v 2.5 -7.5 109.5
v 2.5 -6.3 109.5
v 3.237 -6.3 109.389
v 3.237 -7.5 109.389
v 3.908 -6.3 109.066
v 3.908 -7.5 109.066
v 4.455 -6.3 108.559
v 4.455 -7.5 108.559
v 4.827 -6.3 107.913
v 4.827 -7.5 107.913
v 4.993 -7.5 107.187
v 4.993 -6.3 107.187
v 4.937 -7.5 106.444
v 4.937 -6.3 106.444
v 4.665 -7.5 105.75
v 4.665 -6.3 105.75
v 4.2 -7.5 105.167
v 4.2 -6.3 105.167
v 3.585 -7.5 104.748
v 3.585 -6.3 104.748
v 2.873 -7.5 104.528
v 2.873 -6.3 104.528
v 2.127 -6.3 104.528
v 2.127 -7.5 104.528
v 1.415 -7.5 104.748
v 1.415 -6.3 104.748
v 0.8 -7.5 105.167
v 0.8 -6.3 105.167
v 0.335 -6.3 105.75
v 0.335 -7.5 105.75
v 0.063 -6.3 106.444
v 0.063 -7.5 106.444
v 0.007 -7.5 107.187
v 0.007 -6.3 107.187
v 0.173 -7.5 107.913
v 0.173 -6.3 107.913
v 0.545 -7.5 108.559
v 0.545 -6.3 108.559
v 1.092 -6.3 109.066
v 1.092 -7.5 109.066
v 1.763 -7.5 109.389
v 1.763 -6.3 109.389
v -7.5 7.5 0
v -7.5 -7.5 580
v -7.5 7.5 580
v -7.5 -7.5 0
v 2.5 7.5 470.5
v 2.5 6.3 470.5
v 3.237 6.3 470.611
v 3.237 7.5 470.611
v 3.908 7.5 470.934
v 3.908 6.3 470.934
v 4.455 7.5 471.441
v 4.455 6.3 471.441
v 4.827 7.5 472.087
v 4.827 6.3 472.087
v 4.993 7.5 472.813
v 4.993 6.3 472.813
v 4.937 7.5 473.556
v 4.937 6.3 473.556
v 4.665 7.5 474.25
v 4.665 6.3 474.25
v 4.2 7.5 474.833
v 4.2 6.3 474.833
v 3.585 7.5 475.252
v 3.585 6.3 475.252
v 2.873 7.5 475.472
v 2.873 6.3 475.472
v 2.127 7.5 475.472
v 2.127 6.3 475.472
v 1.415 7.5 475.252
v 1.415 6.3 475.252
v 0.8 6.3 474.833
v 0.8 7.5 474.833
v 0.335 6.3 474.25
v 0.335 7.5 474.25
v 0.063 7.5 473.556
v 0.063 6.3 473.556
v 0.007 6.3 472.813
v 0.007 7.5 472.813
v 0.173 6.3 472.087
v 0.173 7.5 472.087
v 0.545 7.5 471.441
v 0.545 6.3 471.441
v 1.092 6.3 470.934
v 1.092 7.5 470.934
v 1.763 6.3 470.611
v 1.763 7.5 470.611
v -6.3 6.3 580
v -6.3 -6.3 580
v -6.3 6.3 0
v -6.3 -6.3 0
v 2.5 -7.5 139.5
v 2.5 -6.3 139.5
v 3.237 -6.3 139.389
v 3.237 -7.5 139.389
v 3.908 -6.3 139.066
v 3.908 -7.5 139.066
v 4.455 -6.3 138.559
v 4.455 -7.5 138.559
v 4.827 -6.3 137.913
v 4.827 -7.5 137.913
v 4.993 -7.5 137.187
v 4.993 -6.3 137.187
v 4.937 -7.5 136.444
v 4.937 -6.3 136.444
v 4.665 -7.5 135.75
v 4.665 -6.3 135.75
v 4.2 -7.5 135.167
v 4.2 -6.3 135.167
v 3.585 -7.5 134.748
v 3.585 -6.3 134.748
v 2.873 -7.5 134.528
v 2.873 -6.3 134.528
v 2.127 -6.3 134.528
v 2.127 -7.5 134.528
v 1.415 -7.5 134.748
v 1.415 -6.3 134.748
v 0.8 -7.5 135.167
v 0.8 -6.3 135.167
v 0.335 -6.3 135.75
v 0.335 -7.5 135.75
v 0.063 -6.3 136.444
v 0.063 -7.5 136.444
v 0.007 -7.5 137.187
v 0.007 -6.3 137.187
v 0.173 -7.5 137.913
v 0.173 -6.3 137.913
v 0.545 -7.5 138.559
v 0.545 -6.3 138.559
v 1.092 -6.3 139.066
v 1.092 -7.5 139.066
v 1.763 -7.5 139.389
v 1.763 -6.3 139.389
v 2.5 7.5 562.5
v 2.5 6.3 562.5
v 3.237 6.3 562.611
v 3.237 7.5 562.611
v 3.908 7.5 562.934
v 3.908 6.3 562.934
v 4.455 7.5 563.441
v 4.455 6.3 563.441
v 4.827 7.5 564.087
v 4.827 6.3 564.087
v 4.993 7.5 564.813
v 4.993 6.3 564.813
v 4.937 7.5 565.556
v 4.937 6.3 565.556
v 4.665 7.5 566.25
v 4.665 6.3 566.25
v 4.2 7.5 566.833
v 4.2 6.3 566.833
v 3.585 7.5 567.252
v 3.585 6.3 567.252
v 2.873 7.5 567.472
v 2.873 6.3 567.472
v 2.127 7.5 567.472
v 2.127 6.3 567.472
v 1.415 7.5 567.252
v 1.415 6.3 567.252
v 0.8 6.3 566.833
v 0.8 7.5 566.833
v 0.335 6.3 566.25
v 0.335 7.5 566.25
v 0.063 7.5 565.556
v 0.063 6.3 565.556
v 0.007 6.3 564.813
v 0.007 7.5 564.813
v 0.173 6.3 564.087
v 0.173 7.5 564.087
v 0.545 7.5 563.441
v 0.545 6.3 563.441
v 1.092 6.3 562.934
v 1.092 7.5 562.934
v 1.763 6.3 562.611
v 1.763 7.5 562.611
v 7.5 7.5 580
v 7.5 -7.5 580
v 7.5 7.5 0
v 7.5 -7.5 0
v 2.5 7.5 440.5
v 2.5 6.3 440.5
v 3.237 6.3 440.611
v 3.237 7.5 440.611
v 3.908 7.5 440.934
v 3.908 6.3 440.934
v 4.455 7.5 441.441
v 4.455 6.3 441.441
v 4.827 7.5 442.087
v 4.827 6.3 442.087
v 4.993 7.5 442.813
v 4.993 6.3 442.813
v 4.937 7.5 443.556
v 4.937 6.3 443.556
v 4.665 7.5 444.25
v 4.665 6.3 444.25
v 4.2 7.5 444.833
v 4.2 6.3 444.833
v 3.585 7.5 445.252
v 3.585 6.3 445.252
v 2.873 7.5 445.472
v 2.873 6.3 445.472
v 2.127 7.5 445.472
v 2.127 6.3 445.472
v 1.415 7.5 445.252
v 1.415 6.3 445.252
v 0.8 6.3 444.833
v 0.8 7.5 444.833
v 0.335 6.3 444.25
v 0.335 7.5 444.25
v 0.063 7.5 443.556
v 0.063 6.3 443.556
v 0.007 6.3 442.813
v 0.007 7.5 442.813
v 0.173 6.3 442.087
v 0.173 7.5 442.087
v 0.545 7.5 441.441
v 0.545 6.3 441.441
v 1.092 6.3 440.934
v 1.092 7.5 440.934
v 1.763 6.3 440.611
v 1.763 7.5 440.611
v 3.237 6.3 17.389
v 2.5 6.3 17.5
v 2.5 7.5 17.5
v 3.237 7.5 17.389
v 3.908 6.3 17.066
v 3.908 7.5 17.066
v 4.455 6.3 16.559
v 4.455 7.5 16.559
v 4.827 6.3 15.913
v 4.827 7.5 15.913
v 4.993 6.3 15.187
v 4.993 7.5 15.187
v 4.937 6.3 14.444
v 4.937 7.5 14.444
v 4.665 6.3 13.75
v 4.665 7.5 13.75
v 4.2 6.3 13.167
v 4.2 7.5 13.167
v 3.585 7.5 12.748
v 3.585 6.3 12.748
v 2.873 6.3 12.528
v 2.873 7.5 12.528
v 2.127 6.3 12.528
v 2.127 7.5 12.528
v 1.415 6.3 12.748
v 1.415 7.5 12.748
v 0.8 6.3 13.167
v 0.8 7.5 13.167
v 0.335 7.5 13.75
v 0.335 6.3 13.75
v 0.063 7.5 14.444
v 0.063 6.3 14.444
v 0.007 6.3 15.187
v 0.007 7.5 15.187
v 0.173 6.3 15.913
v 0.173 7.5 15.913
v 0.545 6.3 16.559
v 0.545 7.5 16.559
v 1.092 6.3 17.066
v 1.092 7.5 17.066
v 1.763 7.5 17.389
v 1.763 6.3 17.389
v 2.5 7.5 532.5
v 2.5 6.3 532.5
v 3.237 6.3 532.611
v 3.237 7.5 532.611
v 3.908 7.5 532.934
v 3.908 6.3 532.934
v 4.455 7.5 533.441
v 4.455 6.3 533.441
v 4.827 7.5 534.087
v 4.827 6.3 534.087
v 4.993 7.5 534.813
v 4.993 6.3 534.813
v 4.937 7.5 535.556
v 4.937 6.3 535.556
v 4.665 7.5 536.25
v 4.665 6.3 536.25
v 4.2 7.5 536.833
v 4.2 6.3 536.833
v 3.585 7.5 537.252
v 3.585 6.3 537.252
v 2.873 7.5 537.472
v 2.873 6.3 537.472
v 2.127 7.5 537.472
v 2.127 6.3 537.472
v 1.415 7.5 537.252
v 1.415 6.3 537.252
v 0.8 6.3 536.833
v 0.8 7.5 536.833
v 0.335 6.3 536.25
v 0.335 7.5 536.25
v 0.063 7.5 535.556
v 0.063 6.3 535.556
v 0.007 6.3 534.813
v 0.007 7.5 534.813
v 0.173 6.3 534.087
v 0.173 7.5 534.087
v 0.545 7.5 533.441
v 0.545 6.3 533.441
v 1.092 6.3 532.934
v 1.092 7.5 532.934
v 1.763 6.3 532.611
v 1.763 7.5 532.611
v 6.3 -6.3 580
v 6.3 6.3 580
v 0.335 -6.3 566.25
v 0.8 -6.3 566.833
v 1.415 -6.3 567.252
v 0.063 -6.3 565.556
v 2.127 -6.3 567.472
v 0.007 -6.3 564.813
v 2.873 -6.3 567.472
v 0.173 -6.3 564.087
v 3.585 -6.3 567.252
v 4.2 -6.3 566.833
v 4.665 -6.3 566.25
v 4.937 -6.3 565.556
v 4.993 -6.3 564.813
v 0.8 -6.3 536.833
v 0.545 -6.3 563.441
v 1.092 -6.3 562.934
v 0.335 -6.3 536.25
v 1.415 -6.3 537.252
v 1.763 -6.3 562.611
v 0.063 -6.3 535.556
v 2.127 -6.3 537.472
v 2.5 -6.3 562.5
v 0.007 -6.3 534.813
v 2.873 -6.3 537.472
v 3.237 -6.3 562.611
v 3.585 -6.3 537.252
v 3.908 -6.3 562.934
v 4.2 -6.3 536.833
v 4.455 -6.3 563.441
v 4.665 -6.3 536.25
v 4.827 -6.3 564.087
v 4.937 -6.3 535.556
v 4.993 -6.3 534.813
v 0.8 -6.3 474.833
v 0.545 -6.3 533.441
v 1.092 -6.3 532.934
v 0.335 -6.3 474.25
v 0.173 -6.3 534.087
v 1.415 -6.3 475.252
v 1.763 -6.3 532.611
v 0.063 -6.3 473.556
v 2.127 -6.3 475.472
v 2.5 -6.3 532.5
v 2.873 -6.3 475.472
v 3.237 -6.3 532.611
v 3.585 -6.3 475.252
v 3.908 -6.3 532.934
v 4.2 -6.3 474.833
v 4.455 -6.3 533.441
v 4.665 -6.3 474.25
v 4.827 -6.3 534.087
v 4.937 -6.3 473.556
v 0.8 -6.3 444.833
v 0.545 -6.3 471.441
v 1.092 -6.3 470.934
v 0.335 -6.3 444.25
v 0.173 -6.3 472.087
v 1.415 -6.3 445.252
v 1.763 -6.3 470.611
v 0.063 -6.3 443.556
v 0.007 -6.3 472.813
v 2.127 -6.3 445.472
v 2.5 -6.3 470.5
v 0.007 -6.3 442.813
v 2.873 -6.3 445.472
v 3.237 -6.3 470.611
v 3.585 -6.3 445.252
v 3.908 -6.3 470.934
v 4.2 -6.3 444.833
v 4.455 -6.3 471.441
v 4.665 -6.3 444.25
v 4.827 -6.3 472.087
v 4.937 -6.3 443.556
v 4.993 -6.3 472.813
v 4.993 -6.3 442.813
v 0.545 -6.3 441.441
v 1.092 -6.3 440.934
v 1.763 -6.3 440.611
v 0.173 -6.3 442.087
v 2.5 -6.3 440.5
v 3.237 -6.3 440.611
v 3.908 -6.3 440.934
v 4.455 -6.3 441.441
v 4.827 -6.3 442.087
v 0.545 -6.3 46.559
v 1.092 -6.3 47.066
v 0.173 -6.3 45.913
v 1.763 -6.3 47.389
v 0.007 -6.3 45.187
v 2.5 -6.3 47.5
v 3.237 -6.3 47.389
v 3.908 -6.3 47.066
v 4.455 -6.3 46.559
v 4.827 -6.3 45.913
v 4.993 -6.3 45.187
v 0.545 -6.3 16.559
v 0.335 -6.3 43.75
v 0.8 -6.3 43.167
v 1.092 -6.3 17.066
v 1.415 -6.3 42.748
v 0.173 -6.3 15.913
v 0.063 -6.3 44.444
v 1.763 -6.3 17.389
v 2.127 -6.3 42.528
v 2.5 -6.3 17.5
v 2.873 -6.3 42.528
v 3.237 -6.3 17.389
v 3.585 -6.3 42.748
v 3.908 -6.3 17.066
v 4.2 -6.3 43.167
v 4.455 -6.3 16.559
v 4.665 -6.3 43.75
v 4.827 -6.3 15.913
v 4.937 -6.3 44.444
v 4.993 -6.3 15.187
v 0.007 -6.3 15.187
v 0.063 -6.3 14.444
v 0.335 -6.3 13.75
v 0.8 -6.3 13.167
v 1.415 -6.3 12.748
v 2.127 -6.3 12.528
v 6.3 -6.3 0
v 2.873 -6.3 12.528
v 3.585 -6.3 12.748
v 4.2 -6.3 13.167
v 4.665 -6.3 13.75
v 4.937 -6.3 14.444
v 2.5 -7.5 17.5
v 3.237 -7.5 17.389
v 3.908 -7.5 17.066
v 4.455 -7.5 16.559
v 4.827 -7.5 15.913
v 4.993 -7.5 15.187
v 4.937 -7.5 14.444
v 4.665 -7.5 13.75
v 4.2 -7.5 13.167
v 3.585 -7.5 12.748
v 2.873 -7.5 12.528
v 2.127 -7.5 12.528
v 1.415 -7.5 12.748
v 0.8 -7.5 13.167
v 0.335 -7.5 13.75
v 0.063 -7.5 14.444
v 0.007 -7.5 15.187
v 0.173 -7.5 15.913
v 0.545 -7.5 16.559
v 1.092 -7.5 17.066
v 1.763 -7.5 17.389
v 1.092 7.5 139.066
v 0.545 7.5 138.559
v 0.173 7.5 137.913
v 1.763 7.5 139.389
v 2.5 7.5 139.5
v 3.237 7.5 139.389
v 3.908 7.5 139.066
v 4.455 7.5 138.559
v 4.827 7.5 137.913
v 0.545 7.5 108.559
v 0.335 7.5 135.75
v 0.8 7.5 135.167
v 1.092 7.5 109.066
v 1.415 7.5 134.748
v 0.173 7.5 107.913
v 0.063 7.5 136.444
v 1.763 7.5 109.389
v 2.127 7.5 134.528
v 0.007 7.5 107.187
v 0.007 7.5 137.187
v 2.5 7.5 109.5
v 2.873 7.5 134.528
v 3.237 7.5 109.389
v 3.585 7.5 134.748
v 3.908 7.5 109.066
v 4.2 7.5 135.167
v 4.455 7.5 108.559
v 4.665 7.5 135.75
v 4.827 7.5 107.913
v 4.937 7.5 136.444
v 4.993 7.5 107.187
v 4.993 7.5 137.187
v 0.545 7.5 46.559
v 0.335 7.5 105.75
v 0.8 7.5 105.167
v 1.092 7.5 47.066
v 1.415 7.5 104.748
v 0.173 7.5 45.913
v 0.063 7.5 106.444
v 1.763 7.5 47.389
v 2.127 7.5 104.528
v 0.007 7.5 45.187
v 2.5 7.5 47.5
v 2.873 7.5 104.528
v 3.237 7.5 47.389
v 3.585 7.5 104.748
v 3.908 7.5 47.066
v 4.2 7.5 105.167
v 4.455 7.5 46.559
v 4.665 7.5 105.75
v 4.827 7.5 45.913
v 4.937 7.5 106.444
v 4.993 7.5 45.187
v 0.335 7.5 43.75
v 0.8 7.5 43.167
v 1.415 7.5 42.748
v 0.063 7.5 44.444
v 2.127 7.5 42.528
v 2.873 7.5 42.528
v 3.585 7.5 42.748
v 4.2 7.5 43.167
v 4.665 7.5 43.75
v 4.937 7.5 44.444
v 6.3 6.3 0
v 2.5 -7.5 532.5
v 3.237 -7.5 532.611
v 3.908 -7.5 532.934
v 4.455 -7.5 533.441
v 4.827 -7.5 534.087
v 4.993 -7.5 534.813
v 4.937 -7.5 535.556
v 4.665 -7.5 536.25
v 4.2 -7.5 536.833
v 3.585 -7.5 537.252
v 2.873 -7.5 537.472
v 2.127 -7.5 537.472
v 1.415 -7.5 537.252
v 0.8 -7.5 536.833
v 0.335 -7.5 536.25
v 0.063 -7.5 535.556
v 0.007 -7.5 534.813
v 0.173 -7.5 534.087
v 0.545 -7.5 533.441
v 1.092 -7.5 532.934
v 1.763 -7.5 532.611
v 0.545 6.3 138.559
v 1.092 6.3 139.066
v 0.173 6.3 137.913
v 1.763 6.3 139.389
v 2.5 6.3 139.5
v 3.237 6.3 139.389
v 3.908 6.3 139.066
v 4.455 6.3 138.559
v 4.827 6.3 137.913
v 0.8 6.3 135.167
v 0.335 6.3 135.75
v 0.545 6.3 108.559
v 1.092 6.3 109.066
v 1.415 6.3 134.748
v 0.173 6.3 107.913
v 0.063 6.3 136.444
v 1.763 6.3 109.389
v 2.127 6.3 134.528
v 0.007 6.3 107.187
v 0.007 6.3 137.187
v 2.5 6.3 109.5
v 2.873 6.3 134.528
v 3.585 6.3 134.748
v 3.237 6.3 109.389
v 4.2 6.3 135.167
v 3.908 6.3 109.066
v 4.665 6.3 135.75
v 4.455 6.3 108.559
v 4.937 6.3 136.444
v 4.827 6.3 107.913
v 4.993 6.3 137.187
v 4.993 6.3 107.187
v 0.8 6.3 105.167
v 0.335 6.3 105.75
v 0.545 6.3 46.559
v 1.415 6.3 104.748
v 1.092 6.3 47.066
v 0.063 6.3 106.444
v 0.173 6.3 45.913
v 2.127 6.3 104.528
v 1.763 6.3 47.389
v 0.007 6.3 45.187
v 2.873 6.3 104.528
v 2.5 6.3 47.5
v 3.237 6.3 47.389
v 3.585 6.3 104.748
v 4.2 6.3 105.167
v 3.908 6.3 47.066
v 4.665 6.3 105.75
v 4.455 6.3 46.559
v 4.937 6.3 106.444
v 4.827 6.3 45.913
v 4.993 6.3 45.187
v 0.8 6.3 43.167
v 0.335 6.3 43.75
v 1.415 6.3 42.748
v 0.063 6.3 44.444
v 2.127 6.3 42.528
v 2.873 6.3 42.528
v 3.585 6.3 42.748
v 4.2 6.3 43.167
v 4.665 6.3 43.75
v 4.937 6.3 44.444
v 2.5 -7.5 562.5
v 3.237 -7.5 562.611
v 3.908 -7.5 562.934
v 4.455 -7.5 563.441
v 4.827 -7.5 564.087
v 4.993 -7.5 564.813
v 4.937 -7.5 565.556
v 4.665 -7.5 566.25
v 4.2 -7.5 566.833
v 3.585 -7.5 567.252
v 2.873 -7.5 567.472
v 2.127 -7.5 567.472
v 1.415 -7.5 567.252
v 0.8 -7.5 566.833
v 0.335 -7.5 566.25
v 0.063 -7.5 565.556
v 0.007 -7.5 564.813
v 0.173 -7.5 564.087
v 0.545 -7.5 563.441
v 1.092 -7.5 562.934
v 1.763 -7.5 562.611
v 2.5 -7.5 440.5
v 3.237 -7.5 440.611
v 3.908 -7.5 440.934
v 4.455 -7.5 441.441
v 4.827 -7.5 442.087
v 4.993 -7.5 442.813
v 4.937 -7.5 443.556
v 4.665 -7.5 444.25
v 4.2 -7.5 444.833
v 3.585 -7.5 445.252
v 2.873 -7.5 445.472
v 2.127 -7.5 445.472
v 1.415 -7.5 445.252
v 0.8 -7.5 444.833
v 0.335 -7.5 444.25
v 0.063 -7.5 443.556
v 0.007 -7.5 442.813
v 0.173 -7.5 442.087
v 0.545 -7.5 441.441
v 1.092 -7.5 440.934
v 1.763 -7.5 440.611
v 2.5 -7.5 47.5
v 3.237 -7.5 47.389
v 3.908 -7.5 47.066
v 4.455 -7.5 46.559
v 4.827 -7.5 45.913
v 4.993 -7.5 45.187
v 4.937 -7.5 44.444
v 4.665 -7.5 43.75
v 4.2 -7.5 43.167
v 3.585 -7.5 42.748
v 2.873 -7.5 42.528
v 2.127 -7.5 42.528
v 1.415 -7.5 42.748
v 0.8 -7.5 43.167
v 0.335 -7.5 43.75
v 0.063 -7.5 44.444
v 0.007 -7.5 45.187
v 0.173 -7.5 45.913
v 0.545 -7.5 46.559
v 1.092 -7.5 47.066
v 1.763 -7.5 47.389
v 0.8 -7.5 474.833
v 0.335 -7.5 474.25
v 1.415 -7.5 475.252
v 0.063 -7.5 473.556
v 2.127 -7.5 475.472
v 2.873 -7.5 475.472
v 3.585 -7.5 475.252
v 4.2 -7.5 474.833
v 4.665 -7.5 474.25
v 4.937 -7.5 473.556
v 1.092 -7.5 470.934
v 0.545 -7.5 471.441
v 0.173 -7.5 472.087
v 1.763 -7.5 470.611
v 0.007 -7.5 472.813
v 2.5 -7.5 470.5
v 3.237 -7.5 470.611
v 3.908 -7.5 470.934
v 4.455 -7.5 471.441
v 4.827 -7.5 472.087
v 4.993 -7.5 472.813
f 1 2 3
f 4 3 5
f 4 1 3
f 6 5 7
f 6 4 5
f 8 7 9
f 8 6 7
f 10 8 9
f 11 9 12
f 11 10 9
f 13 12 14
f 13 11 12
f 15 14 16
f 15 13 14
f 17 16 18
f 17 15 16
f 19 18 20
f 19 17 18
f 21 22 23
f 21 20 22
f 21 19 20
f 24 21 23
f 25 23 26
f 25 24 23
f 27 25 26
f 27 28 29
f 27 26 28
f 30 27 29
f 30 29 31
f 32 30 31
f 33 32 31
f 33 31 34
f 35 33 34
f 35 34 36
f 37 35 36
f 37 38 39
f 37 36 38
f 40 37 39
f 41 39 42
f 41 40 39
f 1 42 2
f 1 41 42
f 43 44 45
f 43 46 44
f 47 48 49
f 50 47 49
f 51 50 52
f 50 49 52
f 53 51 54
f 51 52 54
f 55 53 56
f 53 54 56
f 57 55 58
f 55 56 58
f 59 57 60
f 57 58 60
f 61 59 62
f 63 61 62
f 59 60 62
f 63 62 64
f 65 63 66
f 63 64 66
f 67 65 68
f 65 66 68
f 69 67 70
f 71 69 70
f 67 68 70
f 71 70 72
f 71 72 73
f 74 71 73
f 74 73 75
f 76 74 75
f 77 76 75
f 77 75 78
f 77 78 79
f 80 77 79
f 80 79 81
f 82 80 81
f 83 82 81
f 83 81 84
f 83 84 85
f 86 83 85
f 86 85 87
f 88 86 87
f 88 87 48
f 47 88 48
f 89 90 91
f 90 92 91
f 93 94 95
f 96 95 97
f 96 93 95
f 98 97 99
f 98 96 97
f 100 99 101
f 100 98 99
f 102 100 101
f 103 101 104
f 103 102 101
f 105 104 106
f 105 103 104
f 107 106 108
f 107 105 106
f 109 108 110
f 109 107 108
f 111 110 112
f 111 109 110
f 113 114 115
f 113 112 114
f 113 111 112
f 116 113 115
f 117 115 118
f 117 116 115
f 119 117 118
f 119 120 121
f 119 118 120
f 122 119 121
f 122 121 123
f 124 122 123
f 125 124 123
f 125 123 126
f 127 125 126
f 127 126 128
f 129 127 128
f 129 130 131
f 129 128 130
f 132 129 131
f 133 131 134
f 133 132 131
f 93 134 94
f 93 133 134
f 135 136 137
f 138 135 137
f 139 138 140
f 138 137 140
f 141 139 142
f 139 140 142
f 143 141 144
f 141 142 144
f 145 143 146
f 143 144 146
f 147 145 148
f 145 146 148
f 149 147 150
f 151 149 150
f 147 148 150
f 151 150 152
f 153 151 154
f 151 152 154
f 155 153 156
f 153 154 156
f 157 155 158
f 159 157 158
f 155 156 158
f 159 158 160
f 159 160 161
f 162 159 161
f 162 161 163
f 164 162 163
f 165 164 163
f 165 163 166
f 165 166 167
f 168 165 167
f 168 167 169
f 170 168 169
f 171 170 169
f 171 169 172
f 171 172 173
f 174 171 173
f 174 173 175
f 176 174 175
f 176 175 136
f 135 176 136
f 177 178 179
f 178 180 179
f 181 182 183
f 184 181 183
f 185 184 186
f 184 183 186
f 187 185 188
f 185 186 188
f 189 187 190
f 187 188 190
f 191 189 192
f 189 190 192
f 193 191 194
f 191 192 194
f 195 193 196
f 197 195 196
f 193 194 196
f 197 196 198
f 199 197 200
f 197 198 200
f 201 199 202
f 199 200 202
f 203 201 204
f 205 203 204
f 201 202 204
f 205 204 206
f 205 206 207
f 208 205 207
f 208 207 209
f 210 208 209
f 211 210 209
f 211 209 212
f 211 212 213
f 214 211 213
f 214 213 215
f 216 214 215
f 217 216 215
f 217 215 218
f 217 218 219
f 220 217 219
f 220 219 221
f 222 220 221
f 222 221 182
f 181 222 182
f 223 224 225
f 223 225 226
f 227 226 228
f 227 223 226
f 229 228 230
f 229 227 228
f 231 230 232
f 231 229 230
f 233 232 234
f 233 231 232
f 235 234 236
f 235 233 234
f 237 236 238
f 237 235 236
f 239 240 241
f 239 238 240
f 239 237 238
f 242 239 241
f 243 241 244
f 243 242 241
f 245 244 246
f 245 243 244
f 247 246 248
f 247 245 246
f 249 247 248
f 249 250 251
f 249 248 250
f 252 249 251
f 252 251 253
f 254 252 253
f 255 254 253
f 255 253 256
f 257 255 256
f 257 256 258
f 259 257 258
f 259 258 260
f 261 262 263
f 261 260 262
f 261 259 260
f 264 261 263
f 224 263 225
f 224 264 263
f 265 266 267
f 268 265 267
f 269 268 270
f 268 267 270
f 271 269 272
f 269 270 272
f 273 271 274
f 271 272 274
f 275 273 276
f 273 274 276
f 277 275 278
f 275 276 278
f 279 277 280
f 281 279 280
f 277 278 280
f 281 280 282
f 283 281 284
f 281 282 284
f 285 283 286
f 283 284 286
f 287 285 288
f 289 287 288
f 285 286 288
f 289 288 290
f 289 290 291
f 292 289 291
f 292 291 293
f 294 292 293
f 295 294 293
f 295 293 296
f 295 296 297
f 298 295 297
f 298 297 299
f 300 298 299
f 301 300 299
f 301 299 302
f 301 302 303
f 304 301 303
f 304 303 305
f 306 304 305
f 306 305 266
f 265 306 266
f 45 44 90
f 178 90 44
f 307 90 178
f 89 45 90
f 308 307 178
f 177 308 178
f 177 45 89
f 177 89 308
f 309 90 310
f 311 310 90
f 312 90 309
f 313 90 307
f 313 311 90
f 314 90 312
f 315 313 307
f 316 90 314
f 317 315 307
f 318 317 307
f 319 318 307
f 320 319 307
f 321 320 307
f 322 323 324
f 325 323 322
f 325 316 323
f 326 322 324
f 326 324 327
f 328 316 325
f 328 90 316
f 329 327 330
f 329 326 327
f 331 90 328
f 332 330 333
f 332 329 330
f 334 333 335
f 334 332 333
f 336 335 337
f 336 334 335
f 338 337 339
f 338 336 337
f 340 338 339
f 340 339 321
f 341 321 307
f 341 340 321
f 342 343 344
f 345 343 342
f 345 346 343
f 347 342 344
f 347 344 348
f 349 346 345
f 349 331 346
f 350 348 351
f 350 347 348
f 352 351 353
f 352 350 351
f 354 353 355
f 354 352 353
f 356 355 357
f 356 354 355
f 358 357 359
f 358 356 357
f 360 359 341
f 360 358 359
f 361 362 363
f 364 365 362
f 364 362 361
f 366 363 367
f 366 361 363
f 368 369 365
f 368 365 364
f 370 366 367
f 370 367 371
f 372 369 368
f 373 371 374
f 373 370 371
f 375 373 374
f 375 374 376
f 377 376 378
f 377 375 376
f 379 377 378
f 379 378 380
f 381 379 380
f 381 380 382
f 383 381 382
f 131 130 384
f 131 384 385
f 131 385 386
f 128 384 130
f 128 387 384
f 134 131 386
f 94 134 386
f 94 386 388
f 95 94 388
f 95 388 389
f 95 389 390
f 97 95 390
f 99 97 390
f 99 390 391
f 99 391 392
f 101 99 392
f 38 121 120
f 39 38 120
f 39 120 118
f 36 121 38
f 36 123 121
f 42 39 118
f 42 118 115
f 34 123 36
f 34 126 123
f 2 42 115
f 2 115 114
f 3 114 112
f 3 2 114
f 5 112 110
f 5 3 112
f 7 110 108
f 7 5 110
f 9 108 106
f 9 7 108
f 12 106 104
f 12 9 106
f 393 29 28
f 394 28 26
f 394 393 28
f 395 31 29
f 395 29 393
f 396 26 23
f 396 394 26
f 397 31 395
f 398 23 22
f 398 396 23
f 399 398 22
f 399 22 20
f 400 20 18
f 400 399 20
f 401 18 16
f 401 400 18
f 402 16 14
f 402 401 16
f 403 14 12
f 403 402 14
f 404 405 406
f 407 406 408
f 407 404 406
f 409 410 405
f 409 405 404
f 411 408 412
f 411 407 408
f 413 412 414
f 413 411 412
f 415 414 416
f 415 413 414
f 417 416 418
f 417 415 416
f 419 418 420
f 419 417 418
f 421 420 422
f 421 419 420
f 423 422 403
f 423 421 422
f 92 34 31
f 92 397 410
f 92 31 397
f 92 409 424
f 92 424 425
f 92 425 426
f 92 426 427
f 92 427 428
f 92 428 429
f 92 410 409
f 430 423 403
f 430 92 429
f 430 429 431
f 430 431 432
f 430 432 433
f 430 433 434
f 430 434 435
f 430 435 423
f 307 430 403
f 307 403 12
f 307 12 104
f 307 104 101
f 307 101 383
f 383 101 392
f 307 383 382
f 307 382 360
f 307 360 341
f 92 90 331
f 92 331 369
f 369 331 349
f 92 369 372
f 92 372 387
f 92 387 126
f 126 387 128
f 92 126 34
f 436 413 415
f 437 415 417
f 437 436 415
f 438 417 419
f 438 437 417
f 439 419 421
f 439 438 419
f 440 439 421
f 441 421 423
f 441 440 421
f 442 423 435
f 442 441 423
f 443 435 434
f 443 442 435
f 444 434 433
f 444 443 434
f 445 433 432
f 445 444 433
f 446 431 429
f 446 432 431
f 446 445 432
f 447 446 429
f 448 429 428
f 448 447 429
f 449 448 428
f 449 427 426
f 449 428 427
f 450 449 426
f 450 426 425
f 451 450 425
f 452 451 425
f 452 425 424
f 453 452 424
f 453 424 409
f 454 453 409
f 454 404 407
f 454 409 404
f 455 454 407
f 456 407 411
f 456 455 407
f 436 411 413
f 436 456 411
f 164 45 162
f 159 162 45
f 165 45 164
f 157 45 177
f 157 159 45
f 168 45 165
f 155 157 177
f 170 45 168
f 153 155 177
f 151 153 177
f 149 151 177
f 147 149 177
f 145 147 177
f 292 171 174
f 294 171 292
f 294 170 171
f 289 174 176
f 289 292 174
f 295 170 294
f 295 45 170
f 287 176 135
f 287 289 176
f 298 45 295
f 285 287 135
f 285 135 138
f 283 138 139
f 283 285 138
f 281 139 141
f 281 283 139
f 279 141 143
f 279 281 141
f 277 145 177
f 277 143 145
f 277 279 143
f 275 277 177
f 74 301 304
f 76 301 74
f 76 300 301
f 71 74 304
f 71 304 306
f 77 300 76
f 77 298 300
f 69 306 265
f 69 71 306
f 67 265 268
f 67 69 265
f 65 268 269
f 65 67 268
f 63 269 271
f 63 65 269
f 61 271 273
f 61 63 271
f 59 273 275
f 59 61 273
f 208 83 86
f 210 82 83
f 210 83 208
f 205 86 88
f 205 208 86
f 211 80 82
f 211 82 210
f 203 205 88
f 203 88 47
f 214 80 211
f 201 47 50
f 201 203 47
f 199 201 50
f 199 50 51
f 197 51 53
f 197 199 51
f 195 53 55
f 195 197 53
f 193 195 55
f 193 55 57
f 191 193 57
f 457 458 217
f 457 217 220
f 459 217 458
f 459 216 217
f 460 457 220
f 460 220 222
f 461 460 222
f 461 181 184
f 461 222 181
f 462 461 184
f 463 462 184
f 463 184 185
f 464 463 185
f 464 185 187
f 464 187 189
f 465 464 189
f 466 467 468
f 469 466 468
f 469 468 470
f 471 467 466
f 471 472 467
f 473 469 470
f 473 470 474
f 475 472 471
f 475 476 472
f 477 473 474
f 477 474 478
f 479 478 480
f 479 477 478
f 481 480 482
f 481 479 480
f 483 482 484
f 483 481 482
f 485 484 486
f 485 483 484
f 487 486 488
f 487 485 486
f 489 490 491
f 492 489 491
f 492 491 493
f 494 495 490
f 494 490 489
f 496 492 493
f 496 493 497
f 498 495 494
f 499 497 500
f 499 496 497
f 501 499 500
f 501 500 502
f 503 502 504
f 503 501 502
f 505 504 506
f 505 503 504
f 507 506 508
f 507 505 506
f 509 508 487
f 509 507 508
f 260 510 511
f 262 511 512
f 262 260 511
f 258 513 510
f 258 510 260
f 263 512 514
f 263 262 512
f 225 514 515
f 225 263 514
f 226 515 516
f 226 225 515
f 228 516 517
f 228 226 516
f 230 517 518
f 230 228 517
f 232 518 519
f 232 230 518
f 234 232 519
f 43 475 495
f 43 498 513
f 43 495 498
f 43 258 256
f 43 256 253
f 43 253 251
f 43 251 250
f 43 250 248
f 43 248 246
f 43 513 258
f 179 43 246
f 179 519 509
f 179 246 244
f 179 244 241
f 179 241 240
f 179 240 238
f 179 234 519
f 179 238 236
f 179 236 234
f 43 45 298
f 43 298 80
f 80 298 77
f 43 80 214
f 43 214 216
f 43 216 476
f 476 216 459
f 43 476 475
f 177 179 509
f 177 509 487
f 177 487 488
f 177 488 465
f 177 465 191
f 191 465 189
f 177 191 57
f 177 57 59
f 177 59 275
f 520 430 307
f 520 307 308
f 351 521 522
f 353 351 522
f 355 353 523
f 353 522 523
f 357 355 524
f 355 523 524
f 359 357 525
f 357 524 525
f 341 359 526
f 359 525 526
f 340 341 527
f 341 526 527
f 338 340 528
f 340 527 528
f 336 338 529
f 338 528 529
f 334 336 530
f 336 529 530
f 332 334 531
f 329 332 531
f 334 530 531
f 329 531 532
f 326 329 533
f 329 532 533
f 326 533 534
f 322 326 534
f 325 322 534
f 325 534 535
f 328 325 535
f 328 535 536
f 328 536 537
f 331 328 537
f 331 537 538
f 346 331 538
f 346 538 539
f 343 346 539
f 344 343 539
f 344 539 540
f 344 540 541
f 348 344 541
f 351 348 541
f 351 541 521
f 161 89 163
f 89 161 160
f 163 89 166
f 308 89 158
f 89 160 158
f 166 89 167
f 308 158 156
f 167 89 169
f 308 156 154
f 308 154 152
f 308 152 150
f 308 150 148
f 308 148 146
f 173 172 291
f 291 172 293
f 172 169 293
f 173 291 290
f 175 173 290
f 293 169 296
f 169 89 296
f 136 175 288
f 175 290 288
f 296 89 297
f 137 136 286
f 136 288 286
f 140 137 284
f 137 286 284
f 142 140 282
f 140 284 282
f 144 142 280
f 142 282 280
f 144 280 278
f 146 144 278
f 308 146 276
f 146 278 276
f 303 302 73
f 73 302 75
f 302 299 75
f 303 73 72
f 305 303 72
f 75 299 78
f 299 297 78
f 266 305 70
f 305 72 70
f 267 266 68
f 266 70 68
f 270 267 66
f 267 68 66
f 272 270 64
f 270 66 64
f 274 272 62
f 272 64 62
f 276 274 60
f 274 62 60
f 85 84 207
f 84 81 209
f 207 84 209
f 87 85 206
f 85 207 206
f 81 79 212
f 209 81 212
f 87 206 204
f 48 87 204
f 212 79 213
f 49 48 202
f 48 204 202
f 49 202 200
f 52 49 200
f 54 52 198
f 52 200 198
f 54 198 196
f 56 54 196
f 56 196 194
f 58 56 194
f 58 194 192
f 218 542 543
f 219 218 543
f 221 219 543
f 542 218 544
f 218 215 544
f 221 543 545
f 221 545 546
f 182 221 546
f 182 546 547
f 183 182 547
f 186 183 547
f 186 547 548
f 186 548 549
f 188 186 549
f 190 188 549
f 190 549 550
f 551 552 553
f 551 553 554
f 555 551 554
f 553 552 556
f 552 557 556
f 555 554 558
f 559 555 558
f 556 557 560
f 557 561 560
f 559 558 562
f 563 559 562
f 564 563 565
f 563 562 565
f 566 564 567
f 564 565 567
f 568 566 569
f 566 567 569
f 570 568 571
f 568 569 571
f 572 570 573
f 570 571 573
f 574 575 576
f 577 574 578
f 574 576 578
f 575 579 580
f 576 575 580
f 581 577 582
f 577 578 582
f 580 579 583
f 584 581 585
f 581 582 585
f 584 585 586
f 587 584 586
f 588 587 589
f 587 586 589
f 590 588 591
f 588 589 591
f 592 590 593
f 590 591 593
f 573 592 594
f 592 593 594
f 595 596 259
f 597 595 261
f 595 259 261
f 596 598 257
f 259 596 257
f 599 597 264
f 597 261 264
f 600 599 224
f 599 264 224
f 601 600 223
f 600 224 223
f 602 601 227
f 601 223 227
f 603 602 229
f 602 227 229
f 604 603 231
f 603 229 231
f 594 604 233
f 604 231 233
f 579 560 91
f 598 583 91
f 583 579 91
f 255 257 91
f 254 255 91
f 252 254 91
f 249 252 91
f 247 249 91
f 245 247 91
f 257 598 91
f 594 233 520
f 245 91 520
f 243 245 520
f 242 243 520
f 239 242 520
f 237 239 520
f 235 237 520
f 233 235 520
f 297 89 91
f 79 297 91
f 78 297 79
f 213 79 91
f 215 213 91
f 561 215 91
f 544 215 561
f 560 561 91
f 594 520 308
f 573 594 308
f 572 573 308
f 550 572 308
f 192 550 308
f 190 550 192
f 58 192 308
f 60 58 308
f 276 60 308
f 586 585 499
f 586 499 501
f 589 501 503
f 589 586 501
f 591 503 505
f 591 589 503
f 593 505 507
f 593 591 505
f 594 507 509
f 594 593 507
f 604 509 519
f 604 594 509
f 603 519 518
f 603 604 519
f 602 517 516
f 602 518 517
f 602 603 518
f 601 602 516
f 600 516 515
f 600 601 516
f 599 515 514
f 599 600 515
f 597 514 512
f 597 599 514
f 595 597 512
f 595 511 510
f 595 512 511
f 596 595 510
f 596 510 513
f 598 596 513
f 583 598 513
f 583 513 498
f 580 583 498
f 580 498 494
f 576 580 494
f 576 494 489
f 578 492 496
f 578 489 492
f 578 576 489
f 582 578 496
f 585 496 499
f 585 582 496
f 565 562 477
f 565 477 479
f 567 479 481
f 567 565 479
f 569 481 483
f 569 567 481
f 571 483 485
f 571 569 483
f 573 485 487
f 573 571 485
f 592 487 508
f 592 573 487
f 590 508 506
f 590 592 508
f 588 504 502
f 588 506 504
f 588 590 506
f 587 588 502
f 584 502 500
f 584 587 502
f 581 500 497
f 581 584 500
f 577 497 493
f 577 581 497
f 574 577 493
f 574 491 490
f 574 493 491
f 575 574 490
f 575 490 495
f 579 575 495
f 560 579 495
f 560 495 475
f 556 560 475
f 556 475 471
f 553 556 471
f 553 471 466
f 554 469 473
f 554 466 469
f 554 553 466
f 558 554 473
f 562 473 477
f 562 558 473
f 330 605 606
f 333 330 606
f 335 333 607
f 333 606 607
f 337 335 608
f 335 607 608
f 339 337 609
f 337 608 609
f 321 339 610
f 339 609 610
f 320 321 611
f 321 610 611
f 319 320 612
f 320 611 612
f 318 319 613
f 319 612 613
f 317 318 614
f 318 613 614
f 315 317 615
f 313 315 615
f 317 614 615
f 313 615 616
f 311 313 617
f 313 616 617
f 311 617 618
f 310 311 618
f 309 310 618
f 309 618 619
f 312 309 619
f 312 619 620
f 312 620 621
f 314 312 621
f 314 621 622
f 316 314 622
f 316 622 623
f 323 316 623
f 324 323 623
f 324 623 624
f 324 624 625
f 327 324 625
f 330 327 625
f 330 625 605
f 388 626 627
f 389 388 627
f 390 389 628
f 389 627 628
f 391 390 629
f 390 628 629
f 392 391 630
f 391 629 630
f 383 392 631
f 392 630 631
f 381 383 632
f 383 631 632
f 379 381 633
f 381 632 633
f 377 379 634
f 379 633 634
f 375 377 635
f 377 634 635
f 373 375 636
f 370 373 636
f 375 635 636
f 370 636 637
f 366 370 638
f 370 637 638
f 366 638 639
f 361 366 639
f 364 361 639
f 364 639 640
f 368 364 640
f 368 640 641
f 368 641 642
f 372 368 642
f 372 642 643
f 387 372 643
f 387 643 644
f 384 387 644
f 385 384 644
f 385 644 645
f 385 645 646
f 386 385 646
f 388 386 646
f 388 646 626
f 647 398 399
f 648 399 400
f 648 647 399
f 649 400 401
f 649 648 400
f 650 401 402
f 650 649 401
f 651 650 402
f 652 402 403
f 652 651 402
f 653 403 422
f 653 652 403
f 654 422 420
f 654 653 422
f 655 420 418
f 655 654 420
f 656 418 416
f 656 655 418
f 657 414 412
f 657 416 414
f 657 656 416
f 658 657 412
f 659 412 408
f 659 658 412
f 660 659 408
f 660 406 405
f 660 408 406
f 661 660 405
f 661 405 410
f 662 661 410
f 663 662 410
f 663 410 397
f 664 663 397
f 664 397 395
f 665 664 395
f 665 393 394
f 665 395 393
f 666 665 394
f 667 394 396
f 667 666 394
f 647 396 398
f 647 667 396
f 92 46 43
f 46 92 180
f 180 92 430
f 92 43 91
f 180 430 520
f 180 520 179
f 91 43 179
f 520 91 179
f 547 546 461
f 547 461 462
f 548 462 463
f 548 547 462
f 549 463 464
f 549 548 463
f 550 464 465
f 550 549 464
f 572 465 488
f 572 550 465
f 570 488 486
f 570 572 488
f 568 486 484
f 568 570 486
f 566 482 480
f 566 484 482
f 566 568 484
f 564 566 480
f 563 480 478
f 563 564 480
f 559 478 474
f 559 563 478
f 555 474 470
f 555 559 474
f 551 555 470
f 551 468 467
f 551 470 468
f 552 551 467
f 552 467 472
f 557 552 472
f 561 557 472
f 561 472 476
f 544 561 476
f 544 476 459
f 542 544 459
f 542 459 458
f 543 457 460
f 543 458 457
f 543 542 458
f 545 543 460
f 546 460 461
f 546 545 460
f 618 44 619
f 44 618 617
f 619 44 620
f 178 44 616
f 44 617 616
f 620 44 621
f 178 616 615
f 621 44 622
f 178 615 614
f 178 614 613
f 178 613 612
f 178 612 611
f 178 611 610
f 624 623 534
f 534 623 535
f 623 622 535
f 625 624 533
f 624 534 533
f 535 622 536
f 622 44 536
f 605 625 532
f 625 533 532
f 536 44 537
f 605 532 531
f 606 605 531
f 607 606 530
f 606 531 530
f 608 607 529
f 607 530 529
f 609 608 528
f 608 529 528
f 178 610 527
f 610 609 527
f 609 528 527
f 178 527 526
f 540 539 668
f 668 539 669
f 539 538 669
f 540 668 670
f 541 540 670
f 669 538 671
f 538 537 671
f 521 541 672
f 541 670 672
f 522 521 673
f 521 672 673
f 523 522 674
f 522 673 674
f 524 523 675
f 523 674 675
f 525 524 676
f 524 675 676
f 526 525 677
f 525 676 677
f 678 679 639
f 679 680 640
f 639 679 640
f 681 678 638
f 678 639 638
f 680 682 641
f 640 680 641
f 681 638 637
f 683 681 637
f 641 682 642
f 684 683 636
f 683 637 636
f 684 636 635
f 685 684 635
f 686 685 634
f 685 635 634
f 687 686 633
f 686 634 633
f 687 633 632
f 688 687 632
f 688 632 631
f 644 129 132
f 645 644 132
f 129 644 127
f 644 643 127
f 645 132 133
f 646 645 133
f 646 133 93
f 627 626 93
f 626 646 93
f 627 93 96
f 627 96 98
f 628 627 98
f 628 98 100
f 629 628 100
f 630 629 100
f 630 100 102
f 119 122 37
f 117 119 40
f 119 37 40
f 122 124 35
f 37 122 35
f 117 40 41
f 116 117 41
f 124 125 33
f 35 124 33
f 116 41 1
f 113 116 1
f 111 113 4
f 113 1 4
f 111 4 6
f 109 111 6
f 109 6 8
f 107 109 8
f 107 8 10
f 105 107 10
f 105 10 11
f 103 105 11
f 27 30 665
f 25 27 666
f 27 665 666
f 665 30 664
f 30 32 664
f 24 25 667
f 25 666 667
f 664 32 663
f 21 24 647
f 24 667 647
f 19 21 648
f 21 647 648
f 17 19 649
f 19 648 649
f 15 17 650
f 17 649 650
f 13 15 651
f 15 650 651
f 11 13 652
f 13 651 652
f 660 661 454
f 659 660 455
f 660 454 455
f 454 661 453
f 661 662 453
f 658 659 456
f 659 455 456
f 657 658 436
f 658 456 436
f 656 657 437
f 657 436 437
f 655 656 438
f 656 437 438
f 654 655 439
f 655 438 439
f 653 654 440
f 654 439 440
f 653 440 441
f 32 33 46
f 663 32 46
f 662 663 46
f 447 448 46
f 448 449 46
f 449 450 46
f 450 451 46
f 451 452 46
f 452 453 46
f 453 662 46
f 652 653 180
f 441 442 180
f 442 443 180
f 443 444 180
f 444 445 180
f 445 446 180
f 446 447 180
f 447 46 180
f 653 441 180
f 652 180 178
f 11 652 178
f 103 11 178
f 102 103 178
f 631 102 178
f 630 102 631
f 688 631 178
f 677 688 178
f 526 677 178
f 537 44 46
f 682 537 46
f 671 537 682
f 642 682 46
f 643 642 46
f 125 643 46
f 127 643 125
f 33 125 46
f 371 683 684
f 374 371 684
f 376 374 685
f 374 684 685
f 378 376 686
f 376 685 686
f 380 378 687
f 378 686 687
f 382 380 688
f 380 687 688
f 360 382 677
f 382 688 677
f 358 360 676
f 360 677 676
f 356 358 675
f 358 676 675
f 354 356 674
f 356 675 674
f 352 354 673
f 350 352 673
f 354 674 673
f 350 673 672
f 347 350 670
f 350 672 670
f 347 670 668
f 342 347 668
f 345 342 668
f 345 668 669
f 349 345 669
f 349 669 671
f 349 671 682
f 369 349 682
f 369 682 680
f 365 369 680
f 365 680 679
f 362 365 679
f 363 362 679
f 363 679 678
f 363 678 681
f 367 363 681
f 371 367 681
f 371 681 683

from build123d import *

# Parameters (mm, degrees)
SKETCH_1_W          = 15
SKETCH_1_H          = 15
SKETCH_1_W_2        = 12.6
SKETCH_1_H_2        = 12.6
EXTRUDE_1_DEPTH     = 570
SKETCH_2_R          = 2.5
CUT_EXTRUDE_1_DEPTH = 25
SKETCH_4_W          = 15
SKETCH_4_H          = 15
SKETCH_4_W_2        = 12.6
SKETCH_4_H_2        = 12.6
EXTRUDE_2_DEPTH     = 10


with BuildPart() as part:
    # 草图1 → 凸台-拉伸1 (new body)
    with BuildSketch(Plane.XY):
        Rectangle(SKETCH_1_W, SKETCH_1_H)
        Rectangle(SKETCH_1_W_2, SKETCH_1_H_2, mode=Mode.SUBTRACT)
    extrude(amount=EXTRUDE_1_DEPTH)

    # 草图2 → 切除-拉伸1 (cut)
    with BuildSketch(Plane.XZ.offset(7.5)):
        with Locations((2.5, 565)):
            Circle(SKETCH_2_R)
        with Locations((2.5, 535)):
            Circle(SKETCH_2_R)
        with Locations((2.5, 473)):
            Circle(SKETCH_2_R)
        with Locations((2.5, 443)):
            Circle(SKETCH_2_R)
    cut_extrude_1 = extrude(amount=-CUT_EXTRUDE_1_DEPTH, mode=Mode.SUBTRACT)

    # 草图4 → 凸台-拉伸2 (add)
    with BuildSketch(Plane.XY.offset(570)):
        Rectangle(SKETCH_4_W, SKETCH_4_H)
        Rectangle(SKETCH_4_W_2, SKETCH_4_H_2, mode=Mode.SUBTRACT)
    extrude(amount=EXTRUDE_2_DEPTH)

    # 镜向1: 切除-拉伸1 across plane
    add(cut_extrude_1.mirror(Plane.XY.offset(290)), mode=Mode.SUBTRACT)


solid = part.part
